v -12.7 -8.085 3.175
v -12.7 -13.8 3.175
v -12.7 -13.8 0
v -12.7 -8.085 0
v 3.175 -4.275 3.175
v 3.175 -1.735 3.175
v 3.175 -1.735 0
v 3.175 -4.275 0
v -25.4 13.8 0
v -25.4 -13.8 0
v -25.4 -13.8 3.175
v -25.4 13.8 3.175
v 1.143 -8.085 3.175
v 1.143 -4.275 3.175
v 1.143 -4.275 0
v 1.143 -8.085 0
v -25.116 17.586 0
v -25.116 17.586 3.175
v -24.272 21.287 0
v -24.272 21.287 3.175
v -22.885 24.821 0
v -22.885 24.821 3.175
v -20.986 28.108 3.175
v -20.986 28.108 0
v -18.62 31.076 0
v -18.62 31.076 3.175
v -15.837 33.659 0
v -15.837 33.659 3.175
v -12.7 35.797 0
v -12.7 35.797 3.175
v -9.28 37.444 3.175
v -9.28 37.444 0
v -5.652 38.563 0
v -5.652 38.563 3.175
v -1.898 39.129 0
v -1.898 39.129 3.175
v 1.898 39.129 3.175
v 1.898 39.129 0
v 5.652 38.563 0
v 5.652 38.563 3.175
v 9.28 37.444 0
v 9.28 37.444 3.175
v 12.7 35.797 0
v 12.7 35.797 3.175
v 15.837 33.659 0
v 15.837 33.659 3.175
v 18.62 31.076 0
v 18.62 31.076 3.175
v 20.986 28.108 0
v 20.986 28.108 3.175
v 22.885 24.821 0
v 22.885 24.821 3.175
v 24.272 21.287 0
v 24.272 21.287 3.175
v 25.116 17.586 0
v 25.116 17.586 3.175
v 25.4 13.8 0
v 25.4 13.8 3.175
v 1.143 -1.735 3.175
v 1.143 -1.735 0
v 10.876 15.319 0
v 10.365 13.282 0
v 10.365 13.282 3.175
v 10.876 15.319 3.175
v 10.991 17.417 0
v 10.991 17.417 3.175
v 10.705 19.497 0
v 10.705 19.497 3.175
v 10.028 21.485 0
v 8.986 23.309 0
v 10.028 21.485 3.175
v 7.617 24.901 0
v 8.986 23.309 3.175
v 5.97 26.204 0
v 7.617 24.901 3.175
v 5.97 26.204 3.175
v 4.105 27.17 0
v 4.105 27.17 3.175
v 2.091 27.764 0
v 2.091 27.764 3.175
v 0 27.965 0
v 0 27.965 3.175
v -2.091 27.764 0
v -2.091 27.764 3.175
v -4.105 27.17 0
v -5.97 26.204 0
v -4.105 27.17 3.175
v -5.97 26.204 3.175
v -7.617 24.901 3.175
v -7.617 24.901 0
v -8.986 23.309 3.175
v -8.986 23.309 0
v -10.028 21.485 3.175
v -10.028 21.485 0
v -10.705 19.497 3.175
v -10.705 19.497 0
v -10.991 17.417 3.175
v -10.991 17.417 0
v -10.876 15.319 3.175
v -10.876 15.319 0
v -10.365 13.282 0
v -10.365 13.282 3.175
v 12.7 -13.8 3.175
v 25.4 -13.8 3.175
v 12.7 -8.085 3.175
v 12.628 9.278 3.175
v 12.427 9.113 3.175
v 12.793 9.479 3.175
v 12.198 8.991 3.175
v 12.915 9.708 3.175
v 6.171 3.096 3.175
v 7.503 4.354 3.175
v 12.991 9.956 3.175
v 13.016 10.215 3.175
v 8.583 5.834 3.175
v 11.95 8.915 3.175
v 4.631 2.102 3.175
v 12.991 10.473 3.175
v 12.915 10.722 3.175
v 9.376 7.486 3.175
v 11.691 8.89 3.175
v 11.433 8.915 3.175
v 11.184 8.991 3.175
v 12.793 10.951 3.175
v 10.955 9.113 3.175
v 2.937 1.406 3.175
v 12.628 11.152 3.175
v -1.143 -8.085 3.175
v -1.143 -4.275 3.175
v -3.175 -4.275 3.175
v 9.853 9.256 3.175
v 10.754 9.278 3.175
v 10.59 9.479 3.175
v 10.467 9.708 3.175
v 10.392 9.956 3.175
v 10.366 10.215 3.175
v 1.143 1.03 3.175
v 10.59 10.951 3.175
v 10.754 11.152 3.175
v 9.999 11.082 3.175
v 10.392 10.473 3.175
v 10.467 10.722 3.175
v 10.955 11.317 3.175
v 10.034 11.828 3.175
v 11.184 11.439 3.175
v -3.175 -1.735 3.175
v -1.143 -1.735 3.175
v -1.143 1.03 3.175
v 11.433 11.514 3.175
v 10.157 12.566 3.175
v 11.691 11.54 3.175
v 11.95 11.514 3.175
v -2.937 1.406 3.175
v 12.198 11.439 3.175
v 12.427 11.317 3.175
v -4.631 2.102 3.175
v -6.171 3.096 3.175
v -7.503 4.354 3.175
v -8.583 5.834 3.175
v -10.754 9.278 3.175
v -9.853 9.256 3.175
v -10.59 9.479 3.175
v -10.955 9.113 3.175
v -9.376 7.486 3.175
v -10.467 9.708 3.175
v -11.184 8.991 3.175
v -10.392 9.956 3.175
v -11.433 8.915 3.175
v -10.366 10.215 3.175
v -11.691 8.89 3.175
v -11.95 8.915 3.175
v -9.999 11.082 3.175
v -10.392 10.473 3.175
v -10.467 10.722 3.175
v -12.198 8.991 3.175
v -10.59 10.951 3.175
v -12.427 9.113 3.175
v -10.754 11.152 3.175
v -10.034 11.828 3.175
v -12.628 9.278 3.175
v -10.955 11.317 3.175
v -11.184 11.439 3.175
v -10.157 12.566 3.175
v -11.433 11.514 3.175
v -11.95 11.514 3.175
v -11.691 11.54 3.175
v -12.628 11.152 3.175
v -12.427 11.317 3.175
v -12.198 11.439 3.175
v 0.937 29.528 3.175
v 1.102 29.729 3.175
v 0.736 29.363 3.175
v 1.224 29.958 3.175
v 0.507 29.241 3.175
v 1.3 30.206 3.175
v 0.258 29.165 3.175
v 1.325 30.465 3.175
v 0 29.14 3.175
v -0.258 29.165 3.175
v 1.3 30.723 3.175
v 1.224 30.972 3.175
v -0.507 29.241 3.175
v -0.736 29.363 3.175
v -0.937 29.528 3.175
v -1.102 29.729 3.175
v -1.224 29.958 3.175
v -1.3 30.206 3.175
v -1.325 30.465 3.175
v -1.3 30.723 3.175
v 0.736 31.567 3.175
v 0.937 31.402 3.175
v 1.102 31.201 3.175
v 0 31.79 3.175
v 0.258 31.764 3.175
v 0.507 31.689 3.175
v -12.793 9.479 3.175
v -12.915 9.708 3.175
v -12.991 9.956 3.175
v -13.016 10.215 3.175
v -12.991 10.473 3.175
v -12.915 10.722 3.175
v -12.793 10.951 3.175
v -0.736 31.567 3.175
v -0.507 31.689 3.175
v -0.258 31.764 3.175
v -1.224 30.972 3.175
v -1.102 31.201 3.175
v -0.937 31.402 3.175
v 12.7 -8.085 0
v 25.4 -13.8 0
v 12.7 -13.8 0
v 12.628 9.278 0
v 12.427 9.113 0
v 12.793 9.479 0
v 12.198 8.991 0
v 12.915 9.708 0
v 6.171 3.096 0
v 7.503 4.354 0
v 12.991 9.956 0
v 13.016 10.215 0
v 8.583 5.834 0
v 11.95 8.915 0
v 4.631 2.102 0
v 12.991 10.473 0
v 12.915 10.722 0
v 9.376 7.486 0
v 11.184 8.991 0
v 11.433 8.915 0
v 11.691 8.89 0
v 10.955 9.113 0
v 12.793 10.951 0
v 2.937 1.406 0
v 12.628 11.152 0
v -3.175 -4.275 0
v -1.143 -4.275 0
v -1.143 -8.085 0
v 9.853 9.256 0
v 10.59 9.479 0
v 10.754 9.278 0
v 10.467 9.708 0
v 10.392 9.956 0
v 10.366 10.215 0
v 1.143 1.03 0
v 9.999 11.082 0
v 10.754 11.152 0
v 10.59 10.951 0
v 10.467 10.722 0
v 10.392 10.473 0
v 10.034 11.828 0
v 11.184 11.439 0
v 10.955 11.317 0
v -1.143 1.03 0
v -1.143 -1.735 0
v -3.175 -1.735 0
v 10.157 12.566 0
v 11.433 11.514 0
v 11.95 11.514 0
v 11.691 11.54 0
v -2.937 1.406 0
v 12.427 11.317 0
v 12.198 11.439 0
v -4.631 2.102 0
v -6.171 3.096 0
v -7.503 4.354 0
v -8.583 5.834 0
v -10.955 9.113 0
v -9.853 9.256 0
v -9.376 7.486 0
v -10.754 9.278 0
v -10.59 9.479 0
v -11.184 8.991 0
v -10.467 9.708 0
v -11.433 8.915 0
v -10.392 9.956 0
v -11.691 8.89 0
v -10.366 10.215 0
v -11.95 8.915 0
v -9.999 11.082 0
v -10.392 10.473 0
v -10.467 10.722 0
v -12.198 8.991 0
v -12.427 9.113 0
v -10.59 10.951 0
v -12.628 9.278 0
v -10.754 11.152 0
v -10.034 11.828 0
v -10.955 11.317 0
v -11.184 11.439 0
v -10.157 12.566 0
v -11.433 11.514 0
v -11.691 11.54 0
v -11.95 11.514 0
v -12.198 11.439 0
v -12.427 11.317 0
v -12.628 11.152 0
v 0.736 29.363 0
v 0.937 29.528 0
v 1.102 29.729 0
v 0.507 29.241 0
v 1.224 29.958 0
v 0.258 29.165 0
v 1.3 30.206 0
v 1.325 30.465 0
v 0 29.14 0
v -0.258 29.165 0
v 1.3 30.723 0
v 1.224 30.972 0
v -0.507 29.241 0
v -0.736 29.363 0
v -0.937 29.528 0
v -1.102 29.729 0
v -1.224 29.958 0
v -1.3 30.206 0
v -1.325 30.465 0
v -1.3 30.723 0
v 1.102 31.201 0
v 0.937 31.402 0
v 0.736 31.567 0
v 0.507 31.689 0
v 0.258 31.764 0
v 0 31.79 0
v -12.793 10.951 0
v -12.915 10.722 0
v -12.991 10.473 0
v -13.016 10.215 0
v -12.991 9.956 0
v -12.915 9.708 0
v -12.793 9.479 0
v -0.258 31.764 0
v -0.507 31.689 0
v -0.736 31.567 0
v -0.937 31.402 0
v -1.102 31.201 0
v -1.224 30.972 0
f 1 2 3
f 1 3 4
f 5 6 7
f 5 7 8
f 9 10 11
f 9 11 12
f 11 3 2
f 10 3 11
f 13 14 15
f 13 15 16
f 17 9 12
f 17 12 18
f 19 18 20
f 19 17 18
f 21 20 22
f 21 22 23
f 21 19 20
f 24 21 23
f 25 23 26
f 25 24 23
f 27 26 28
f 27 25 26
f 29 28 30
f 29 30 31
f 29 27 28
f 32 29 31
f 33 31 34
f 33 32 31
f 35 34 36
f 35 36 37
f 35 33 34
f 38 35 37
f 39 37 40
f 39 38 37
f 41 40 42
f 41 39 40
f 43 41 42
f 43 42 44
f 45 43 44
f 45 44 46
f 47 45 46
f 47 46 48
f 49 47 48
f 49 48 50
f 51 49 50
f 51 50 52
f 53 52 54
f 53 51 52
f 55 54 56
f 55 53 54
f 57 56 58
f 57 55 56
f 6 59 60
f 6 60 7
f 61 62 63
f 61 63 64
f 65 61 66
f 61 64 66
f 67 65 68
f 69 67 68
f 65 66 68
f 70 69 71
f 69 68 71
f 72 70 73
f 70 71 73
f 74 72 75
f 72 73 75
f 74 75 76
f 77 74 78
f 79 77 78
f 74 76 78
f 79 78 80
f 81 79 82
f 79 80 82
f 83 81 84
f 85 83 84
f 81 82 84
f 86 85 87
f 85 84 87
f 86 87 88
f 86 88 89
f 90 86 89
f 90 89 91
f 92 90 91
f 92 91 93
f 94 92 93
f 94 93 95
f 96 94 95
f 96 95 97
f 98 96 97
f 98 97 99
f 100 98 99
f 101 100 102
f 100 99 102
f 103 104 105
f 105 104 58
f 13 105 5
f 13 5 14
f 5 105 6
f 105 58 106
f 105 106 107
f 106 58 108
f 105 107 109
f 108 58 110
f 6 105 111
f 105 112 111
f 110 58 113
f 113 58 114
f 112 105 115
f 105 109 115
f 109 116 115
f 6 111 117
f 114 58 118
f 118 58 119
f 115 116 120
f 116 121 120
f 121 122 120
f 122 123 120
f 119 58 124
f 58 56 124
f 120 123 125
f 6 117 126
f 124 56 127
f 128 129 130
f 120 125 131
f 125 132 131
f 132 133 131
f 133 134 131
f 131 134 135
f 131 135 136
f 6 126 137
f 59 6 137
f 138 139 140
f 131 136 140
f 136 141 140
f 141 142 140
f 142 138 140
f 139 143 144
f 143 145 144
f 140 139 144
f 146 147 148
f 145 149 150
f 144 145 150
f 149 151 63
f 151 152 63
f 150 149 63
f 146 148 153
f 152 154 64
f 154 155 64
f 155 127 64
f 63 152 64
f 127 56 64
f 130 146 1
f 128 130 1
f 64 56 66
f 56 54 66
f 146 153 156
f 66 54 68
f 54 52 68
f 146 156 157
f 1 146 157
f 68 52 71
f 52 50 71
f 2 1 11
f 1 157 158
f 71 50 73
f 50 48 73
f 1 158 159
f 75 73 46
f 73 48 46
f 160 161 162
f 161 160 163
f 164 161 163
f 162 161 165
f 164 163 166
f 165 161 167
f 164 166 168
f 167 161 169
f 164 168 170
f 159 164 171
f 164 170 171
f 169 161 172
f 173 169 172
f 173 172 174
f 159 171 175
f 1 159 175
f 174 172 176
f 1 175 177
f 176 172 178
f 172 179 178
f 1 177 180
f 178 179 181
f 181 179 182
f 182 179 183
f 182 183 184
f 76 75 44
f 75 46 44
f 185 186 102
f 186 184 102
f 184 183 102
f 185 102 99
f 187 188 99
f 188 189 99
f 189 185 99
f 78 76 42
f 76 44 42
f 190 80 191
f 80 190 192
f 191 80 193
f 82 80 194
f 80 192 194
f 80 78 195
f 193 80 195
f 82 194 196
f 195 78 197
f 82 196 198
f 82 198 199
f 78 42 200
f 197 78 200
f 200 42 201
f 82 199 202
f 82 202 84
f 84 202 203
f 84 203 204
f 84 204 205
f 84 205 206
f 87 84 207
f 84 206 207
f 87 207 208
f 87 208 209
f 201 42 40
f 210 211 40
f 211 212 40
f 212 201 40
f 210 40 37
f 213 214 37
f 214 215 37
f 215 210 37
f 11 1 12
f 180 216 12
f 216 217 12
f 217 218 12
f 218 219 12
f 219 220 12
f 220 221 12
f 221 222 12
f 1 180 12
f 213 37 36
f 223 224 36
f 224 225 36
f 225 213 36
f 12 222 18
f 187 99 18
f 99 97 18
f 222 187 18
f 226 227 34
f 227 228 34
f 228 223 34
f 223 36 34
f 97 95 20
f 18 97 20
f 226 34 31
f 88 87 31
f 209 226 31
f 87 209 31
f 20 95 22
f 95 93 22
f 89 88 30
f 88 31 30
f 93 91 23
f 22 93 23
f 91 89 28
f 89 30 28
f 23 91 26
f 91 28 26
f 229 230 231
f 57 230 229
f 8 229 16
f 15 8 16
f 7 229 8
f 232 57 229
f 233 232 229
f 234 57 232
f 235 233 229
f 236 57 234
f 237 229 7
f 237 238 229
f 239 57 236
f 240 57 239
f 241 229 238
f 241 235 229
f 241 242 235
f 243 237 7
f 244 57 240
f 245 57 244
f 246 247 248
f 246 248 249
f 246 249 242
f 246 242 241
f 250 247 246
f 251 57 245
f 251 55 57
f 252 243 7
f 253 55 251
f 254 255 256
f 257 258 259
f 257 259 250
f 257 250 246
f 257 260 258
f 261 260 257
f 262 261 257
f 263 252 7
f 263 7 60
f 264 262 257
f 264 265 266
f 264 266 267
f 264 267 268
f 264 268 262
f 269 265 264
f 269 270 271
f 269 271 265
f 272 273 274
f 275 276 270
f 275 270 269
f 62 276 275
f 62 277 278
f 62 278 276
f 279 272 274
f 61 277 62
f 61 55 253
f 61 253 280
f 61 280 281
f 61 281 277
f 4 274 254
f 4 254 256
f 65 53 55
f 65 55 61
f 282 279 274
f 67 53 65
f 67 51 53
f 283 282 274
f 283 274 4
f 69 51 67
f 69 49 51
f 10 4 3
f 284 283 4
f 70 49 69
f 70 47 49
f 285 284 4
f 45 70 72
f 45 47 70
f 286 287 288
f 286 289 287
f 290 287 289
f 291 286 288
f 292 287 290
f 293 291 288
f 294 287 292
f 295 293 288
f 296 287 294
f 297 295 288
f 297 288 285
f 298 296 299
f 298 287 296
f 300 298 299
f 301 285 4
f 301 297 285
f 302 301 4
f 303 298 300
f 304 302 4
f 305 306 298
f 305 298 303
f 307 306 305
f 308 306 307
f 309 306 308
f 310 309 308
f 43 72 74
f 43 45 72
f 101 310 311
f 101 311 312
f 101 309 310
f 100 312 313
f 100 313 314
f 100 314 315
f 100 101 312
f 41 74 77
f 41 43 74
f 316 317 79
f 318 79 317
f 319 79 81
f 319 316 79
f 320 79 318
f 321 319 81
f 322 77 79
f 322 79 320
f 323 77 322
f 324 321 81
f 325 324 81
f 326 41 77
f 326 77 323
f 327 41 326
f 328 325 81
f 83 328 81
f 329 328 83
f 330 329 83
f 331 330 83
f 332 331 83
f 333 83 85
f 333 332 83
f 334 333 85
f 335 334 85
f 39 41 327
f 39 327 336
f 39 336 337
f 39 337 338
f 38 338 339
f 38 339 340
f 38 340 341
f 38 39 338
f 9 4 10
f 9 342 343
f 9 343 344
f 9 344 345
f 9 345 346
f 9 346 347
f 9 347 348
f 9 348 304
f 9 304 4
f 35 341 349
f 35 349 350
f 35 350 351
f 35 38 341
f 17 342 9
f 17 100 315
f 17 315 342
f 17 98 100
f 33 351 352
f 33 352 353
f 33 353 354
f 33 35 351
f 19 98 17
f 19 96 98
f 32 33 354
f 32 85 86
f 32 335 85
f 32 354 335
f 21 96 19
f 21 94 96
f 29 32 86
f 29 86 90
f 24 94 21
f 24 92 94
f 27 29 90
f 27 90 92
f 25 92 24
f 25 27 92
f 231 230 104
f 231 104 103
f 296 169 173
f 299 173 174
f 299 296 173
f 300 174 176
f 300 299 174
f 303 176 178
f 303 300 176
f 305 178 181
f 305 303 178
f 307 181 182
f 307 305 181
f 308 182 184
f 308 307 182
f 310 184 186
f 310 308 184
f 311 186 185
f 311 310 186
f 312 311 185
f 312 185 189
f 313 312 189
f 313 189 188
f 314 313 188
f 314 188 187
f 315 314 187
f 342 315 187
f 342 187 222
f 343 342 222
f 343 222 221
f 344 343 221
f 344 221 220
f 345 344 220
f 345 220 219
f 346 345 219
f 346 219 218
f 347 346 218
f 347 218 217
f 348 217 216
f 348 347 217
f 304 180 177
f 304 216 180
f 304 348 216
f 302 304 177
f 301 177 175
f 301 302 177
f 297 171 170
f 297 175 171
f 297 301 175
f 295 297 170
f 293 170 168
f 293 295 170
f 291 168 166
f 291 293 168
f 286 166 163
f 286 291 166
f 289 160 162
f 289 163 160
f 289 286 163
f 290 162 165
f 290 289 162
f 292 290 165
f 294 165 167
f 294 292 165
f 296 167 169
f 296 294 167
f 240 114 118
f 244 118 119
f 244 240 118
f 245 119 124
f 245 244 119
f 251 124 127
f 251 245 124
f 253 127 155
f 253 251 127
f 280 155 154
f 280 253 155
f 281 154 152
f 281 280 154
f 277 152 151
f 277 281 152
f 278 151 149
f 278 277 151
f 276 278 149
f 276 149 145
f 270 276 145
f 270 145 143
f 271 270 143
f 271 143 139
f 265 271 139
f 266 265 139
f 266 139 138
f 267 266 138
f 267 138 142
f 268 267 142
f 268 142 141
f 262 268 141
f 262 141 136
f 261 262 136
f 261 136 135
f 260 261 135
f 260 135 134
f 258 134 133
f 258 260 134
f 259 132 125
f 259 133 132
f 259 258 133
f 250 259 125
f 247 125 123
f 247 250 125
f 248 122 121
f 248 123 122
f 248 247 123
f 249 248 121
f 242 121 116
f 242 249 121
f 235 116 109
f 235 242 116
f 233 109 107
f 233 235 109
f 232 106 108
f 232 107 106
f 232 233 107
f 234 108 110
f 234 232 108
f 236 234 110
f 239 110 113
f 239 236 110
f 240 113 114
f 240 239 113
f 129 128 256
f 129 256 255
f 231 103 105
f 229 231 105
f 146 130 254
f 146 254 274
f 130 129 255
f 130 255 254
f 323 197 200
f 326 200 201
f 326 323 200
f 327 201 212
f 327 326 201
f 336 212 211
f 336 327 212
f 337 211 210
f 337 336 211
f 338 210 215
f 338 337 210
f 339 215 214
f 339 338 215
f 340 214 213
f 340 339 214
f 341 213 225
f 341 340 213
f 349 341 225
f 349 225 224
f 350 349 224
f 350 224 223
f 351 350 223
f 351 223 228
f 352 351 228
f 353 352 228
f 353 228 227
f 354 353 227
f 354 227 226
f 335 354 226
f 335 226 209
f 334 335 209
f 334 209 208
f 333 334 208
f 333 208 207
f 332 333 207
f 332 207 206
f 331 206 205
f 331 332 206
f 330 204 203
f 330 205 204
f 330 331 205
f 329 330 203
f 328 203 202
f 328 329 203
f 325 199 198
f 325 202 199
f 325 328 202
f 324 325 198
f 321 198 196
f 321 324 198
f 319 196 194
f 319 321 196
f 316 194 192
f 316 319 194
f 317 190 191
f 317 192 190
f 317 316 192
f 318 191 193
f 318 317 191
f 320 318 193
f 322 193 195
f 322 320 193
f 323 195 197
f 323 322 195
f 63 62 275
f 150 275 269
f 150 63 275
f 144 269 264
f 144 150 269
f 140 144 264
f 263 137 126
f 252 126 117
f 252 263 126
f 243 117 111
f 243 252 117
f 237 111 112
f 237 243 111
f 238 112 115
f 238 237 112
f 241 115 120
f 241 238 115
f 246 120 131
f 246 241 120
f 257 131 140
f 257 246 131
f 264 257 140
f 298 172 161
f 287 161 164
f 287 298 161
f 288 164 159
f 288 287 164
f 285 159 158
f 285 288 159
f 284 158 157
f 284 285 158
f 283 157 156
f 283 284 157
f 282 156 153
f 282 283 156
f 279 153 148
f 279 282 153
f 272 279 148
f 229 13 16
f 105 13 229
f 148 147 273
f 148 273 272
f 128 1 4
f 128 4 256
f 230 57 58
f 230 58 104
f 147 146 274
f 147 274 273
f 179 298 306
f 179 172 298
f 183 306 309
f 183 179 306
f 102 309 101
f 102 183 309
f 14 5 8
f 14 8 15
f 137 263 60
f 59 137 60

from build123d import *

# Parameters (mm, degrees)
BOSS_EXTRUDE1_DEPTH = 3.175
CUT_EXTRUDE1_REACH  = 48.818
SKETCH2_R           = 11
CUT_EXTRUDE2_REACH  = 48.818
SKETCH3_W           = 25.4
SKETCH3_H           = 5.715
CUT_EXTRUDE4_REACH  = 48.818
SKETCH6_R           = 1.3250037
CUT_EXTRUDE6_DEPTH  = 47.817591721
SKETCH7_R           = 10
CUT_EXTRUDE7_DEPTH  = 47.817591721
FILLET1_R           = 6.35


with BuildPart() as part:
    # Sketch1 → Boss-Extrude1 (new body)
    with BuildSketch(Plane.XY):
        with BuildLine():
            Line((25.4, -13.800079969), (-25.4, -13.800079969))
            Line((-25.4, -13.800079969), (-25.4, 13.800079969))
            ThreePointArc((-25.4, 13.800079969), (0, 39.200079969), (25.4, 13.800079969))
            Line((25.4, 13.800079969), (25.4, -13.800079969))
        make_face()
    extrude(amount=BOSS_EXTRUDE1_DEPTH)

    # Sketch2 → Cut-Extrude1 (cut, up to next)
    with BuildSketch(Plane.XY.offset(3.175), mode=Mode.PRIVATE) as cut_extrude1_sk1:
        with Locations((0, 16.964919969)):
            Circle(SKETCH2_R)
    cut_extrude1_tool1 = extrude(cut_extrude1_sk1.sketch, amount=-CUT_EXTRUDE1_REACH, mode=Mode.PRIVATE) & part.part
    add(cut_extrude1_tool1.solids().sort_by_distance((0, 16.96492, 3.175))[0], mode=Mode.SUBTRACT)

    # Sketch3 → Cut-Extrude2 (cut, up to next)
    with BuildSketch(Plane.XY.offset(3.175), mode=Mode.PRIVATE) as cut_extrude2_sk1:
        with Locations((0, -10.942579969)):
            Rectangle(SKETCH3_W, SKETCH3_H)
    cut_extrude2_tool1 = extrude(cut_extrude2_sk1.sketch, amount=-CUT_EXTRUDE2_REACH, mode=Mode.PRIVATE) & part.part
    add(cut_extrude2_tool1.solids().sort_by_distance((0, -10.94258, 3.175))[0], mode=Mode.SUBTRACT)

    # Sketch5 → Cut-Extrude4 (cut, up to next)
    with BuildSketch(Plane.XY.offset(3.175), mode=Mode.PRIVATE) as cut_extrude4_sk1:
        Polygon((3.175, -4.275079969), (1.143, -4.275079969), (1.143, -8.085079969), (-1.143, -8.085079969), (-1.143, -4.275079969), (-3.175, -4.275079969), (-3.175, -1.735079969), (-1.143, -1.735079969), (-1.143, 7.154920031), (1.143, 7.154920031), (1.143, -1.735079969), (3.175, -1.735079969), align=None)
    cut_extrude4_tool1 = extrude(cut_extrude4_sk1.sketch, amount=-CUT_EXTRUDE4_REACH, mode=Mode.PRIVATE) & part.part
    add(cut_extrude4_tool1.solids().sort_by_distance((0, -1.045651, 3.175))[0], mode=Mode.SUBTRACT)

    # Sketch6 → Cut-Extrude6 (cut, through all)
    with BuildSketch(Plane.XY):
        with Locations((0, 30.464919969)):
            Circle(SKETCH6_R)
        with Locations((11.691342951, 10.214919969)):
            Circle(SKETCH6_R)
        with Locations((-11.691342951, 10.214919969)):
            Circle(SKETCH6_R)
    extrude(amount=CUT_EXTRUDE6_DEPTH, mode=Mode.SUBTRACT)

    # Sketch7 → Cut-Extrude7 (cut, through all)
    with BuildSketch(Plane.XY):
        with Locations((0, 10.964920031)):
            Circle(SKETCH7_R)
    extrude(amount=CUT_EXTRUDE7_DEPTH, mode=Mode.SUBTRACT)

    # Fillet1
    fillet1_edges = [part.edges().sort_by_distance(p)[0] for p in [
        (9.921567423, 12.214919982, 1.5875),
        (-9.921567423, 12.214919982, 1.5875),
    ]]
    fillet(fillet1_edges, radius=FILLET1_R)


solid = part.part
